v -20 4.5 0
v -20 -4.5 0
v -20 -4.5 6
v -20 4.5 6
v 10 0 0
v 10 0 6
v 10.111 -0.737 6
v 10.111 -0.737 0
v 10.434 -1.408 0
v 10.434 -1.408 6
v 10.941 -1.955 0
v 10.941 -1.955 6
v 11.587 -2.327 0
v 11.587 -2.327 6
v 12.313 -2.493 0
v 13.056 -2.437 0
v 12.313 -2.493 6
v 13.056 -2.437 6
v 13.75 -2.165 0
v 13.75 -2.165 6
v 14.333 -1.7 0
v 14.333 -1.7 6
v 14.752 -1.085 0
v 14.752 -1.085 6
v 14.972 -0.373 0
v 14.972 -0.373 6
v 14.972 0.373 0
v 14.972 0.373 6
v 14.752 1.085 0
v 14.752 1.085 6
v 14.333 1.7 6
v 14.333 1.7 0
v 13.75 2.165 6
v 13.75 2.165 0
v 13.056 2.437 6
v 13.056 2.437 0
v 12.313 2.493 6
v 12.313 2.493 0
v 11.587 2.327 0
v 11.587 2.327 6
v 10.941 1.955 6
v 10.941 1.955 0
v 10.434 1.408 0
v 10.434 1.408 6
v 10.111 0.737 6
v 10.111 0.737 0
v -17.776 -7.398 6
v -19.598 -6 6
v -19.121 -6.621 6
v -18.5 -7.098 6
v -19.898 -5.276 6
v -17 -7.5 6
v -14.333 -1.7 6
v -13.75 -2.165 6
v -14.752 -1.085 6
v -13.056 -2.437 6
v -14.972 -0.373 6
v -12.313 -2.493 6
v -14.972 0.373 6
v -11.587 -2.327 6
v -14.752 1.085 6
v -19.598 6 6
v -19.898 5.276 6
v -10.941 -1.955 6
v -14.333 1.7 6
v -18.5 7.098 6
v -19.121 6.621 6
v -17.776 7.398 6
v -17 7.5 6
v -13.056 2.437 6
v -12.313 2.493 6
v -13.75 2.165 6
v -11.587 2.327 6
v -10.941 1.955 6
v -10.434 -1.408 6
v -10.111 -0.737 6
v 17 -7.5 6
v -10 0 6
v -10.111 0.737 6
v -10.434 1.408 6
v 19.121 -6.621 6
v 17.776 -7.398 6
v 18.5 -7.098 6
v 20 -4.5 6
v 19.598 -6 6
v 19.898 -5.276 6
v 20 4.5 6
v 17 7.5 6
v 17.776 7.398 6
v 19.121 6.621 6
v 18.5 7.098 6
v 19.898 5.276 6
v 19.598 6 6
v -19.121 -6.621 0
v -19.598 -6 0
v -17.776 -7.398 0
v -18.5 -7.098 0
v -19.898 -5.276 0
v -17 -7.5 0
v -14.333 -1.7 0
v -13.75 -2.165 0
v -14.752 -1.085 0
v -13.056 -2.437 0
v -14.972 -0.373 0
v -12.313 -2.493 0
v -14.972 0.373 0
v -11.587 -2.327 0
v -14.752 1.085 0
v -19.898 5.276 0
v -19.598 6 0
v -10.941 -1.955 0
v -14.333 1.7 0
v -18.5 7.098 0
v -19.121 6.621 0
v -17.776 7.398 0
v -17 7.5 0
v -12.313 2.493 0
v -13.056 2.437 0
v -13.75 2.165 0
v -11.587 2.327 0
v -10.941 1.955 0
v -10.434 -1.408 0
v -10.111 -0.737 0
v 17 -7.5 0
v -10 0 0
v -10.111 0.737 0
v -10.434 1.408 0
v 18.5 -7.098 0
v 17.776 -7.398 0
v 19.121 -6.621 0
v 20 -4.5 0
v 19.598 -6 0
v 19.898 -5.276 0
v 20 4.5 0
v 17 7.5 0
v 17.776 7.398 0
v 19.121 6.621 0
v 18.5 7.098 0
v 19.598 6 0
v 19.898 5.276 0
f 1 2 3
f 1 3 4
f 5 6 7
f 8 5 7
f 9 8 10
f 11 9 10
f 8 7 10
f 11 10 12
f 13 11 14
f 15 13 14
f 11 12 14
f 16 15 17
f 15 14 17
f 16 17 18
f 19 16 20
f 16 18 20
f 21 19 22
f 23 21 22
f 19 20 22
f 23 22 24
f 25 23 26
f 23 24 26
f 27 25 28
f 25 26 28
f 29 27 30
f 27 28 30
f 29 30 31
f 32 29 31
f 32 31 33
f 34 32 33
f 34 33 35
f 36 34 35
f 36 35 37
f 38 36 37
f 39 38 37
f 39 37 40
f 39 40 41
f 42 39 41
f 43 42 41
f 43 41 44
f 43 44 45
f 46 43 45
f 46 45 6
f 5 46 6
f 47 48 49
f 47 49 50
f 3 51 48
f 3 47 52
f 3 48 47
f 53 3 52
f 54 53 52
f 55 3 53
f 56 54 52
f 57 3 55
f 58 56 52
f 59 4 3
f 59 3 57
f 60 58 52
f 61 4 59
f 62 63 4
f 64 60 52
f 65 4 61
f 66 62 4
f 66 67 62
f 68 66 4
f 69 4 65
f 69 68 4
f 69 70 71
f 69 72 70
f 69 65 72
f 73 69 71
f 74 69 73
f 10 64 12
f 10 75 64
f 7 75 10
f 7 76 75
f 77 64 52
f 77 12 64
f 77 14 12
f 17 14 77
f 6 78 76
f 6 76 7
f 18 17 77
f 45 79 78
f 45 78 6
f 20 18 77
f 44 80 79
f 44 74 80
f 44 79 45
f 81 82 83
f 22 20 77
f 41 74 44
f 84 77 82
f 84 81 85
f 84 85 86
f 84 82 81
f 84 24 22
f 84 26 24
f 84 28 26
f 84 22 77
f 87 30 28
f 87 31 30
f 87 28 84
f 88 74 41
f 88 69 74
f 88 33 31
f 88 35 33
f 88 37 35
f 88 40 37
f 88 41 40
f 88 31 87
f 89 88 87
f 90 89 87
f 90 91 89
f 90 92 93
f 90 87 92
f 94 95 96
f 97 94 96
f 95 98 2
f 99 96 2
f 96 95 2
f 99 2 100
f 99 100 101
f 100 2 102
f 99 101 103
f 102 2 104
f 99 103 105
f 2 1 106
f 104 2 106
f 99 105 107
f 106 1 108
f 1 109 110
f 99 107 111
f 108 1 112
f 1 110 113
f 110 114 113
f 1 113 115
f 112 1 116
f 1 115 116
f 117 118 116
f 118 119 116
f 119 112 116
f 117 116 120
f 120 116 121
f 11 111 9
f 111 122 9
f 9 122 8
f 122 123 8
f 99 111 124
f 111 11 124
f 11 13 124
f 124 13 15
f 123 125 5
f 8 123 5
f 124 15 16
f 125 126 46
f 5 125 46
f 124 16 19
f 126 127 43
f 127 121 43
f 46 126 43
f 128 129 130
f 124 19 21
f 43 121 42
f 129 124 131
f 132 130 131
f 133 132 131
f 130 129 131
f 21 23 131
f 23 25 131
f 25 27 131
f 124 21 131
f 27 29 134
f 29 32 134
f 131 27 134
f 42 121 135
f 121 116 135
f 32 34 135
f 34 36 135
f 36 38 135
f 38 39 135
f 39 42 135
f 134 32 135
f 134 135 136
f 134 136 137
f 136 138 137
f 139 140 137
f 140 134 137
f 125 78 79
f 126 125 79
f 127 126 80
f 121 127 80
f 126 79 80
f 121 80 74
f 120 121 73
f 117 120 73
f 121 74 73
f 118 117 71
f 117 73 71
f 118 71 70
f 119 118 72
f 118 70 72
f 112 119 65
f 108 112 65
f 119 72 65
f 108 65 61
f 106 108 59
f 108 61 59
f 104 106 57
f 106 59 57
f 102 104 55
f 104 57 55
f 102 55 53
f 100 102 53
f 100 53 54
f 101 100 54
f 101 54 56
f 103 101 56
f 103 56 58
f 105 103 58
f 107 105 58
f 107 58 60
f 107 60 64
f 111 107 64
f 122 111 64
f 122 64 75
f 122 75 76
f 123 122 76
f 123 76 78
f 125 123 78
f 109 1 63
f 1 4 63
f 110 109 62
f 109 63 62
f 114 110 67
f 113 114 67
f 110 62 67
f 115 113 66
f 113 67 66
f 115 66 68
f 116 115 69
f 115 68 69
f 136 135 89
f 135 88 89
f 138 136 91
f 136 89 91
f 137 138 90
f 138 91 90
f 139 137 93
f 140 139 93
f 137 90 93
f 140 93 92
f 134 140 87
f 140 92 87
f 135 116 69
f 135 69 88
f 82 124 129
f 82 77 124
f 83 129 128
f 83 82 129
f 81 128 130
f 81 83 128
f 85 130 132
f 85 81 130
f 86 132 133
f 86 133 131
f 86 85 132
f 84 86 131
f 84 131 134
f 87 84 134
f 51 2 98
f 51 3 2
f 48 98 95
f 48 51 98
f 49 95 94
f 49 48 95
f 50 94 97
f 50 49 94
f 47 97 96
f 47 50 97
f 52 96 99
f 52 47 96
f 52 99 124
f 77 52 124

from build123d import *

# Parameters (mm, degrees)
SKETCH_1_W          = 40
SKETCH_1_H          = 15
EXTRUDE_1_DEPTH     = 6
SKETCH_2_R          = 2.5
CUT_EXTRUDE_1_DEPTH = 23.186707732
FILLET_1_R          = 3


with BuildPart() as part:
    # 草图1 → 凸台-拉伸1 (new body)
    with BuildSketch(Plane.XY):
        Rectangle(SKETCH_1_W, SKETCH_1_H)
    extrude(amount=EXTRUDE_1_DEPTH)

    # 草图2 → 切除-拉伸1 (cut, through all)
    with BuildSketch(Plane.XY.offset(6)):
        with Locations((-12.5, 0)):
            Circle(SKETCH_2_R)
        with Locations(Location((12.5, 0, 0), (0, 0, 180))):
            Circle(SKETCH_2_R)
    extrude(amount=-CUT_EXTRUDE_1_DEPTH, mode=Mode.SUBTRACT)

    # 圆角1
    fillet_1_edges = [part.edges().sort_by_distance(p)[0] for p in [
        (20, -7.5, 3),
        (-20, -7.5, 3),
        (-20, 7.5, 3),
        (20, 7.5, 3),
    ]]
    fillet(fillet_1_edges, radius=FILLET_1_R)


solid = part.part
